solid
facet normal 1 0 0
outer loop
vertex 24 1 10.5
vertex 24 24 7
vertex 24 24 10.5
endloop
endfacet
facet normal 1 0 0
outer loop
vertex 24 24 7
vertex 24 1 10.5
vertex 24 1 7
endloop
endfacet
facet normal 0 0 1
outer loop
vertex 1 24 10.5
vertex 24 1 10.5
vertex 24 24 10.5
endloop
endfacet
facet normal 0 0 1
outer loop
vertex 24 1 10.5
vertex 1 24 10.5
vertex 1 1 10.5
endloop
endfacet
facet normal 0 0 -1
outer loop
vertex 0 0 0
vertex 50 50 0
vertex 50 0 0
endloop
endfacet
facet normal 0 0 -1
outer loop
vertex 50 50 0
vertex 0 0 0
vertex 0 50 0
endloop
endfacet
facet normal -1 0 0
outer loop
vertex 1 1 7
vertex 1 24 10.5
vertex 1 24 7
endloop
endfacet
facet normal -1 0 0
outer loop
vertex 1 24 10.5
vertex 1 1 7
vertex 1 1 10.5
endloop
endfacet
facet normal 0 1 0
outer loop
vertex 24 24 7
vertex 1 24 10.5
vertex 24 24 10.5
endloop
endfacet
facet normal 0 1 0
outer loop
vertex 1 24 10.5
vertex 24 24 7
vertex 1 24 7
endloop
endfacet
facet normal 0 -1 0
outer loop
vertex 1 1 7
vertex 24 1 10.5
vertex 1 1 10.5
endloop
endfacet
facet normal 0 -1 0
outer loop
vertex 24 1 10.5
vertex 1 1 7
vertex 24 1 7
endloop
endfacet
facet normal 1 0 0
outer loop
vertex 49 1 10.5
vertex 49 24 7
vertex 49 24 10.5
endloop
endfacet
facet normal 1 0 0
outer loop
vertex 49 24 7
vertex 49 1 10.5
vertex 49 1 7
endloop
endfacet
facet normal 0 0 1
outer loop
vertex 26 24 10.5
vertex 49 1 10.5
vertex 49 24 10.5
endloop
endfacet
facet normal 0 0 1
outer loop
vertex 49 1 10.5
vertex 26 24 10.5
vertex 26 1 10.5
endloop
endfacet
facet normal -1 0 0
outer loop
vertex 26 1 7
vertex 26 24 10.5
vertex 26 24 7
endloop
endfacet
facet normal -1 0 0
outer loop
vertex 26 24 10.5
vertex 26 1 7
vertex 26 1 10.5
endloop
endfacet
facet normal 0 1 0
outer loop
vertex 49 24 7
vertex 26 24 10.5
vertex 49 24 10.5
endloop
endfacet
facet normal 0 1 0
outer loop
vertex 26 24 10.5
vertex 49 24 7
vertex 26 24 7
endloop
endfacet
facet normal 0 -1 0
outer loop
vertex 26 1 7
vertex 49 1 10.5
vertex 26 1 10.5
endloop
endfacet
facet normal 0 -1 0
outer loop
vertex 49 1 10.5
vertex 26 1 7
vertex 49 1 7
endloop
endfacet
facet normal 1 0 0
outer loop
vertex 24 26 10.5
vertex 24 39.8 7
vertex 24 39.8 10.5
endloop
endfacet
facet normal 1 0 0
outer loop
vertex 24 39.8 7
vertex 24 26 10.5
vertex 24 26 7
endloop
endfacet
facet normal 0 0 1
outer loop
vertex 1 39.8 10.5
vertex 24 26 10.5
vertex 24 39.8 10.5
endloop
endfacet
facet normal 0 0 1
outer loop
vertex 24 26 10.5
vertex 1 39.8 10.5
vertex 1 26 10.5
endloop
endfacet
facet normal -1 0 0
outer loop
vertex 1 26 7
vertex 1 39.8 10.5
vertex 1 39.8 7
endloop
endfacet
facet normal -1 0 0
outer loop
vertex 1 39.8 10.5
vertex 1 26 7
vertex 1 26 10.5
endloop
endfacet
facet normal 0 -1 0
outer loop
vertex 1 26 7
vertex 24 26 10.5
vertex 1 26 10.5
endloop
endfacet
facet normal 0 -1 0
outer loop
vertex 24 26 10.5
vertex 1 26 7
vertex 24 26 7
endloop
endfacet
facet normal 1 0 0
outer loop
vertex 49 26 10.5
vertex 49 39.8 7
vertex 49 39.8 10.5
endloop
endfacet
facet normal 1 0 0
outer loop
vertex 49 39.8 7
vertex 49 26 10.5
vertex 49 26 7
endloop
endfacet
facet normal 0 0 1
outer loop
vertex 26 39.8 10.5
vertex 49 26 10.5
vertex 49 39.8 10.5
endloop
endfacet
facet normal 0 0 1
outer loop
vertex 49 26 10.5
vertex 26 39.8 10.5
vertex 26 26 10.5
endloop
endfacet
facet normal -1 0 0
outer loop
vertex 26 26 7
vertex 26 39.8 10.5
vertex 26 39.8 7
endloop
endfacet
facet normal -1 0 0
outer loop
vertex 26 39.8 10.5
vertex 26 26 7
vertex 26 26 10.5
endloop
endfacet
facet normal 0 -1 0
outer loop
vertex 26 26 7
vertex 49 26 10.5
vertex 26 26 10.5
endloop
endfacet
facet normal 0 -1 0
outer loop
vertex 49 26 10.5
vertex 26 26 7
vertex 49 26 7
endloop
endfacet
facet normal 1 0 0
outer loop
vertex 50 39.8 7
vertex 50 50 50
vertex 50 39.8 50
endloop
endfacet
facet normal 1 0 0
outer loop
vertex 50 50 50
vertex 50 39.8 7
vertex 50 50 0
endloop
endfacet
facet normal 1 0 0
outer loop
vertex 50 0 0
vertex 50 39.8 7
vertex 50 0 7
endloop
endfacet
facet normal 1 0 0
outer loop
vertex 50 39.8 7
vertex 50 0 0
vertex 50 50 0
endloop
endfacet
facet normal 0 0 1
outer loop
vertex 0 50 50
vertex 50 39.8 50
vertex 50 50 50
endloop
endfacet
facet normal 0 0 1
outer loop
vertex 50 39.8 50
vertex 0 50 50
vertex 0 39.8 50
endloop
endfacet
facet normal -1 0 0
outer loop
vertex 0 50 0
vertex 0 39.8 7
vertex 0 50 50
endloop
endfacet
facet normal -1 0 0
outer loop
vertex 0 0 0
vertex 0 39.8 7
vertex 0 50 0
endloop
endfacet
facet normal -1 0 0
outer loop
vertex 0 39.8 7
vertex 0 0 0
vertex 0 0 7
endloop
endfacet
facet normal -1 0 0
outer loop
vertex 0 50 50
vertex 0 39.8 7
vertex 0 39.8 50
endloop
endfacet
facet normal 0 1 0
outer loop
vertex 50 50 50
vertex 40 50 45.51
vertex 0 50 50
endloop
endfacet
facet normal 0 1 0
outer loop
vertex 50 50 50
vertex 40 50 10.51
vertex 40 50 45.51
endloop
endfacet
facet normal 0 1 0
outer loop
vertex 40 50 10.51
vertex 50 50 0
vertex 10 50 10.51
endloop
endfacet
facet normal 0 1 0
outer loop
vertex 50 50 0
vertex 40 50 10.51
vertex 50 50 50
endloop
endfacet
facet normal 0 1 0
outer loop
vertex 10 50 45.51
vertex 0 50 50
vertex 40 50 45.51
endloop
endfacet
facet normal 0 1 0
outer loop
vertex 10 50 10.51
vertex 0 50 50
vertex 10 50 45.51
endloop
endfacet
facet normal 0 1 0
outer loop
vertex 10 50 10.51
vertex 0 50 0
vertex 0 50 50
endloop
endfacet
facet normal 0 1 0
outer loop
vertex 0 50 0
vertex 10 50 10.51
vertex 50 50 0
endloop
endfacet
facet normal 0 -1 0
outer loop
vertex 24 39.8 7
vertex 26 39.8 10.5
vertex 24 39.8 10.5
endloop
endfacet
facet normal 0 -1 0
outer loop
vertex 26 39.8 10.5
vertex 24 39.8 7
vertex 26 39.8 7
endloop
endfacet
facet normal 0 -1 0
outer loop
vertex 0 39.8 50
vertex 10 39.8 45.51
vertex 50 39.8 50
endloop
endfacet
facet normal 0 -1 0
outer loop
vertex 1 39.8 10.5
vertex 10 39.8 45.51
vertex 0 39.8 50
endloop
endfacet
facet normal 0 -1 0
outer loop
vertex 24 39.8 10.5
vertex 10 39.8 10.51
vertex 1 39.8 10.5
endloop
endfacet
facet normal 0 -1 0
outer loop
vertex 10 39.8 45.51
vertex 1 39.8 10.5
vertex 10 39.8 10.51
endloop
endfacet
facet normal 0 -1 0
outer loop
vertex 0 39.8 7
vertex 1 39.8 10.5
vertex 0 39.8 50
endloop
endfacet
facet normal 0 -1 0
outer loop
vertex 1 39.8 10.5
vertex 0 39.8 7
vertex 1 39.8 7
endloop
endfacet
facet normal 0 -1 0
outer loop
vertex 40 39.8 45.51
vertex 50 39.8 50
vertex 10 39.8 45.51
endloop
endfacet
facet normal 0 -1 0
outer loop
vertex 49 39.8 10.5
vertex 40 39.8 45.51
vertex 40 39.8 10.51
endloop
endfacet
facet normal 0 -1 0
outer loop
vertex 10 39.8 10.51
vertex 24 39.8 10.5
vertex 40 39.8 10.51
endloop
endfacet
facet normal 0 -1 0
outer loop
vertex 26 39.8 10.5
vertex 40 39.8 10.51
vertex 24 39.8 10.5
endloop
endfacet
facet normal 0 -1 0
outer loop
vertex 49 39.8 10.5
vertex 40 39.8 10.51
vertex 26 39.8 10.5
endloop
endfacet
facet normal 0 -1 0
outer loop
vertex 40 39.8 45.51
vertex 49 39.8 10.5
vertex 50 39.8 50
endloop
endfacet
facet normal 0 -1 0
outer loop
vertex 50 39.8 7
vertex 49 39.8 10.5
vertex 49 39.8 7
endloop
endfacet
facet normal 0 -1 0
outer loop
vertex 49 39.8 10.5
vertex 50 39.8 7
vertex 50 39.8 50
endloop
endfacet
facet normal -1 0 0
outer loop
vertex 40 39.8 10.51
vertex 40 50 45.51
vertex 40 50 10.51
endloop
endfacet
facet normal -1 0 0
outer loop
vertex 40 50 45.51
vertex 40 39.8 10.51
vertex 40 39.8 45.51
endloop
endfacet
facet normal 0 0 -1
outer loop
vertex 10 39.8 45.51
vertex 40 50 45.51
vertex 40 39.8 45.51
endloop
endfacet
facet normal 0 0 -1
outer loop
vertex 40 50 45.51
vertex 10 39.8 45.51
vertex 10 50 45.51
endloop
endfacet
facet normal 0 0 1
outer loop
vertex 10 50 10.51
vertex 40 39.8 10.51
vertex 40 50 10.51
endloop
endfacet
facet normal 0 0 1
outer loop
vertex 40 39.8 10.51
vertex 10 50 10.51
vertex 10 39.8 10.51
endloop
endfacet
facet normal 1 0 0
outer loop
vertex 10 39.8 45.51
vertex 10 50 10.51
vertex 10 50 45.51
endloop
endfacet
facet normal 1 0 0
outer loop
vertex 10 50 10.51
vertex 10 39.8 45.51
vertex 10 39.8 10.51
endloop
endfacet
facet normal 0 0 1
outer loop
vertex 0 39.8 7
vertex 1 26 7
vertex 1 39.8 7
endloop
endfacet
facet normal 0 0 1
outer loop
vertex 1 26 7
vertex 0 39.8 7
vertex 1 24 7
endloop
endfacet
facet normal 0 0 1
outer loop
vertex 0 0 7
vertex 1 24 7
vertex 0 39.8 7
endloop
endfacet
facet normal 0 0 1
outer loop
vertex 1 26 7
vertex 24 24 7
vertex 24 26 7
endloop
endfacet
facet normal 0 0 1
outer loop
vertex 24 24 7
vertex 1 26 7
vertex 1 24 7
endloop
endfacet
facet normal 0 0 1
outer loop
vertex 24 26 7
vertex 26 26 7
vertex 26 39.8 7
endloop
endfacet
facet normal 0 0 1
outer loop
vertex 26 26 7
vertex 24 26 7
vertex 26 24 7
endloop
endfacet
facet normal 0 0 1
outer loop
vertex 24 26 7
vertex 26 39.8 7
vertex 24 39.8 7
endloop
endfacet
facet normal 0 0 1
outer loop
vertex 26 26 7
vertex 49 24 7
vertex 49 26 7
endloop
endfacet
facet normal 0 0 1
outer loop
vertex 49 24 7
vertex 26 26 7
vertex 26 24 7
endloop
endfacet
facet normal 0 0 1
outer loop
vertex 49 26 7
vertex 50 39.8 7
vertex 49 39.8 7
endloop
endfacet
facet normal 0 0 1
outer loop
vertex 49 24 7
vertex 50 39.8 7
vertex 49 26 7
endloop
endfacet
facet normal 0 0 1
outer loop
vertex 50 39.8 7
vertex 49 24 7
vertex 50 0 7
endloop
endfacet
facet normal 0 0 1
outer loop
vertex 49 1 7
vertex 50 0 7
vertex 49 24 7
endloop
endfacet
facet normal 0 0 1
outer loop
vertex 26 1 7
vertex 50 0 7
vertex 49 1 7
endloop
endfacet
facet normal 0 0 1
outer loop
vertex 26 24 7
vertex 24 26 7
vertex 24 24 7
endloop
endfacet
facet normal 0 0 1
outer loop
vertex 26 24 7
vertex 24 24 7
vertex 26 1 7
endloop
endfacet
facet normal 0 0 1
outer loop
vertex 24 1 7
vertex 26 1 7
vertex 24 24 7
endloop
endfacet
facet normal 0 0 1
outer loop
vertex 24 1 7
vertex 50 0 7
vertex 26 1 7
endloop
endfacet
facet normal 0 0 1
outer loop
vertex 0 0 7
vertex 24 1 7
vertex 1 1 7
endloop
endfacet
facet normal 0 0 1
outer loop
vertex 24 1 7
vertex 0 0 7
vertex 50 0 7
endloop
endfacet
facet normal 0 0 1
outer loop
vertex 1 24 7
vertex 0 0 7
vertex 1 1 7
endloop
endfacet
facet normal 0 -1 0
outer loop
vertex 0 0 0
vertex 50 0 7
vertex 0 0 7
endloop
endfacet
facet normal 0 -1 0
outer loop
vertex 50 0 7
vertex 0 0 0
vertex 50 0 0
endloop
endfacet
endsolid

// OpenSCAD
color("LightGray") {
    translate([1,1,0]) cube([23,23,6+4.5]);
    translate([25+1,1,0]) cube([23,23,6+4.5]);
    translate([1,25+1,0]) cube([23,23,6+4.5]);
    translate([25+1,25+1,0]) cube([23,23,6+4.5]);
}
color("Grey") {
    cube([50,50,6+1]);
    difference() {
        translate([0,50-10.2,0]) cube([50,10.2,50]);
        translate([10,25,6+4.51]) cube([30,50,35]);
    }
}
